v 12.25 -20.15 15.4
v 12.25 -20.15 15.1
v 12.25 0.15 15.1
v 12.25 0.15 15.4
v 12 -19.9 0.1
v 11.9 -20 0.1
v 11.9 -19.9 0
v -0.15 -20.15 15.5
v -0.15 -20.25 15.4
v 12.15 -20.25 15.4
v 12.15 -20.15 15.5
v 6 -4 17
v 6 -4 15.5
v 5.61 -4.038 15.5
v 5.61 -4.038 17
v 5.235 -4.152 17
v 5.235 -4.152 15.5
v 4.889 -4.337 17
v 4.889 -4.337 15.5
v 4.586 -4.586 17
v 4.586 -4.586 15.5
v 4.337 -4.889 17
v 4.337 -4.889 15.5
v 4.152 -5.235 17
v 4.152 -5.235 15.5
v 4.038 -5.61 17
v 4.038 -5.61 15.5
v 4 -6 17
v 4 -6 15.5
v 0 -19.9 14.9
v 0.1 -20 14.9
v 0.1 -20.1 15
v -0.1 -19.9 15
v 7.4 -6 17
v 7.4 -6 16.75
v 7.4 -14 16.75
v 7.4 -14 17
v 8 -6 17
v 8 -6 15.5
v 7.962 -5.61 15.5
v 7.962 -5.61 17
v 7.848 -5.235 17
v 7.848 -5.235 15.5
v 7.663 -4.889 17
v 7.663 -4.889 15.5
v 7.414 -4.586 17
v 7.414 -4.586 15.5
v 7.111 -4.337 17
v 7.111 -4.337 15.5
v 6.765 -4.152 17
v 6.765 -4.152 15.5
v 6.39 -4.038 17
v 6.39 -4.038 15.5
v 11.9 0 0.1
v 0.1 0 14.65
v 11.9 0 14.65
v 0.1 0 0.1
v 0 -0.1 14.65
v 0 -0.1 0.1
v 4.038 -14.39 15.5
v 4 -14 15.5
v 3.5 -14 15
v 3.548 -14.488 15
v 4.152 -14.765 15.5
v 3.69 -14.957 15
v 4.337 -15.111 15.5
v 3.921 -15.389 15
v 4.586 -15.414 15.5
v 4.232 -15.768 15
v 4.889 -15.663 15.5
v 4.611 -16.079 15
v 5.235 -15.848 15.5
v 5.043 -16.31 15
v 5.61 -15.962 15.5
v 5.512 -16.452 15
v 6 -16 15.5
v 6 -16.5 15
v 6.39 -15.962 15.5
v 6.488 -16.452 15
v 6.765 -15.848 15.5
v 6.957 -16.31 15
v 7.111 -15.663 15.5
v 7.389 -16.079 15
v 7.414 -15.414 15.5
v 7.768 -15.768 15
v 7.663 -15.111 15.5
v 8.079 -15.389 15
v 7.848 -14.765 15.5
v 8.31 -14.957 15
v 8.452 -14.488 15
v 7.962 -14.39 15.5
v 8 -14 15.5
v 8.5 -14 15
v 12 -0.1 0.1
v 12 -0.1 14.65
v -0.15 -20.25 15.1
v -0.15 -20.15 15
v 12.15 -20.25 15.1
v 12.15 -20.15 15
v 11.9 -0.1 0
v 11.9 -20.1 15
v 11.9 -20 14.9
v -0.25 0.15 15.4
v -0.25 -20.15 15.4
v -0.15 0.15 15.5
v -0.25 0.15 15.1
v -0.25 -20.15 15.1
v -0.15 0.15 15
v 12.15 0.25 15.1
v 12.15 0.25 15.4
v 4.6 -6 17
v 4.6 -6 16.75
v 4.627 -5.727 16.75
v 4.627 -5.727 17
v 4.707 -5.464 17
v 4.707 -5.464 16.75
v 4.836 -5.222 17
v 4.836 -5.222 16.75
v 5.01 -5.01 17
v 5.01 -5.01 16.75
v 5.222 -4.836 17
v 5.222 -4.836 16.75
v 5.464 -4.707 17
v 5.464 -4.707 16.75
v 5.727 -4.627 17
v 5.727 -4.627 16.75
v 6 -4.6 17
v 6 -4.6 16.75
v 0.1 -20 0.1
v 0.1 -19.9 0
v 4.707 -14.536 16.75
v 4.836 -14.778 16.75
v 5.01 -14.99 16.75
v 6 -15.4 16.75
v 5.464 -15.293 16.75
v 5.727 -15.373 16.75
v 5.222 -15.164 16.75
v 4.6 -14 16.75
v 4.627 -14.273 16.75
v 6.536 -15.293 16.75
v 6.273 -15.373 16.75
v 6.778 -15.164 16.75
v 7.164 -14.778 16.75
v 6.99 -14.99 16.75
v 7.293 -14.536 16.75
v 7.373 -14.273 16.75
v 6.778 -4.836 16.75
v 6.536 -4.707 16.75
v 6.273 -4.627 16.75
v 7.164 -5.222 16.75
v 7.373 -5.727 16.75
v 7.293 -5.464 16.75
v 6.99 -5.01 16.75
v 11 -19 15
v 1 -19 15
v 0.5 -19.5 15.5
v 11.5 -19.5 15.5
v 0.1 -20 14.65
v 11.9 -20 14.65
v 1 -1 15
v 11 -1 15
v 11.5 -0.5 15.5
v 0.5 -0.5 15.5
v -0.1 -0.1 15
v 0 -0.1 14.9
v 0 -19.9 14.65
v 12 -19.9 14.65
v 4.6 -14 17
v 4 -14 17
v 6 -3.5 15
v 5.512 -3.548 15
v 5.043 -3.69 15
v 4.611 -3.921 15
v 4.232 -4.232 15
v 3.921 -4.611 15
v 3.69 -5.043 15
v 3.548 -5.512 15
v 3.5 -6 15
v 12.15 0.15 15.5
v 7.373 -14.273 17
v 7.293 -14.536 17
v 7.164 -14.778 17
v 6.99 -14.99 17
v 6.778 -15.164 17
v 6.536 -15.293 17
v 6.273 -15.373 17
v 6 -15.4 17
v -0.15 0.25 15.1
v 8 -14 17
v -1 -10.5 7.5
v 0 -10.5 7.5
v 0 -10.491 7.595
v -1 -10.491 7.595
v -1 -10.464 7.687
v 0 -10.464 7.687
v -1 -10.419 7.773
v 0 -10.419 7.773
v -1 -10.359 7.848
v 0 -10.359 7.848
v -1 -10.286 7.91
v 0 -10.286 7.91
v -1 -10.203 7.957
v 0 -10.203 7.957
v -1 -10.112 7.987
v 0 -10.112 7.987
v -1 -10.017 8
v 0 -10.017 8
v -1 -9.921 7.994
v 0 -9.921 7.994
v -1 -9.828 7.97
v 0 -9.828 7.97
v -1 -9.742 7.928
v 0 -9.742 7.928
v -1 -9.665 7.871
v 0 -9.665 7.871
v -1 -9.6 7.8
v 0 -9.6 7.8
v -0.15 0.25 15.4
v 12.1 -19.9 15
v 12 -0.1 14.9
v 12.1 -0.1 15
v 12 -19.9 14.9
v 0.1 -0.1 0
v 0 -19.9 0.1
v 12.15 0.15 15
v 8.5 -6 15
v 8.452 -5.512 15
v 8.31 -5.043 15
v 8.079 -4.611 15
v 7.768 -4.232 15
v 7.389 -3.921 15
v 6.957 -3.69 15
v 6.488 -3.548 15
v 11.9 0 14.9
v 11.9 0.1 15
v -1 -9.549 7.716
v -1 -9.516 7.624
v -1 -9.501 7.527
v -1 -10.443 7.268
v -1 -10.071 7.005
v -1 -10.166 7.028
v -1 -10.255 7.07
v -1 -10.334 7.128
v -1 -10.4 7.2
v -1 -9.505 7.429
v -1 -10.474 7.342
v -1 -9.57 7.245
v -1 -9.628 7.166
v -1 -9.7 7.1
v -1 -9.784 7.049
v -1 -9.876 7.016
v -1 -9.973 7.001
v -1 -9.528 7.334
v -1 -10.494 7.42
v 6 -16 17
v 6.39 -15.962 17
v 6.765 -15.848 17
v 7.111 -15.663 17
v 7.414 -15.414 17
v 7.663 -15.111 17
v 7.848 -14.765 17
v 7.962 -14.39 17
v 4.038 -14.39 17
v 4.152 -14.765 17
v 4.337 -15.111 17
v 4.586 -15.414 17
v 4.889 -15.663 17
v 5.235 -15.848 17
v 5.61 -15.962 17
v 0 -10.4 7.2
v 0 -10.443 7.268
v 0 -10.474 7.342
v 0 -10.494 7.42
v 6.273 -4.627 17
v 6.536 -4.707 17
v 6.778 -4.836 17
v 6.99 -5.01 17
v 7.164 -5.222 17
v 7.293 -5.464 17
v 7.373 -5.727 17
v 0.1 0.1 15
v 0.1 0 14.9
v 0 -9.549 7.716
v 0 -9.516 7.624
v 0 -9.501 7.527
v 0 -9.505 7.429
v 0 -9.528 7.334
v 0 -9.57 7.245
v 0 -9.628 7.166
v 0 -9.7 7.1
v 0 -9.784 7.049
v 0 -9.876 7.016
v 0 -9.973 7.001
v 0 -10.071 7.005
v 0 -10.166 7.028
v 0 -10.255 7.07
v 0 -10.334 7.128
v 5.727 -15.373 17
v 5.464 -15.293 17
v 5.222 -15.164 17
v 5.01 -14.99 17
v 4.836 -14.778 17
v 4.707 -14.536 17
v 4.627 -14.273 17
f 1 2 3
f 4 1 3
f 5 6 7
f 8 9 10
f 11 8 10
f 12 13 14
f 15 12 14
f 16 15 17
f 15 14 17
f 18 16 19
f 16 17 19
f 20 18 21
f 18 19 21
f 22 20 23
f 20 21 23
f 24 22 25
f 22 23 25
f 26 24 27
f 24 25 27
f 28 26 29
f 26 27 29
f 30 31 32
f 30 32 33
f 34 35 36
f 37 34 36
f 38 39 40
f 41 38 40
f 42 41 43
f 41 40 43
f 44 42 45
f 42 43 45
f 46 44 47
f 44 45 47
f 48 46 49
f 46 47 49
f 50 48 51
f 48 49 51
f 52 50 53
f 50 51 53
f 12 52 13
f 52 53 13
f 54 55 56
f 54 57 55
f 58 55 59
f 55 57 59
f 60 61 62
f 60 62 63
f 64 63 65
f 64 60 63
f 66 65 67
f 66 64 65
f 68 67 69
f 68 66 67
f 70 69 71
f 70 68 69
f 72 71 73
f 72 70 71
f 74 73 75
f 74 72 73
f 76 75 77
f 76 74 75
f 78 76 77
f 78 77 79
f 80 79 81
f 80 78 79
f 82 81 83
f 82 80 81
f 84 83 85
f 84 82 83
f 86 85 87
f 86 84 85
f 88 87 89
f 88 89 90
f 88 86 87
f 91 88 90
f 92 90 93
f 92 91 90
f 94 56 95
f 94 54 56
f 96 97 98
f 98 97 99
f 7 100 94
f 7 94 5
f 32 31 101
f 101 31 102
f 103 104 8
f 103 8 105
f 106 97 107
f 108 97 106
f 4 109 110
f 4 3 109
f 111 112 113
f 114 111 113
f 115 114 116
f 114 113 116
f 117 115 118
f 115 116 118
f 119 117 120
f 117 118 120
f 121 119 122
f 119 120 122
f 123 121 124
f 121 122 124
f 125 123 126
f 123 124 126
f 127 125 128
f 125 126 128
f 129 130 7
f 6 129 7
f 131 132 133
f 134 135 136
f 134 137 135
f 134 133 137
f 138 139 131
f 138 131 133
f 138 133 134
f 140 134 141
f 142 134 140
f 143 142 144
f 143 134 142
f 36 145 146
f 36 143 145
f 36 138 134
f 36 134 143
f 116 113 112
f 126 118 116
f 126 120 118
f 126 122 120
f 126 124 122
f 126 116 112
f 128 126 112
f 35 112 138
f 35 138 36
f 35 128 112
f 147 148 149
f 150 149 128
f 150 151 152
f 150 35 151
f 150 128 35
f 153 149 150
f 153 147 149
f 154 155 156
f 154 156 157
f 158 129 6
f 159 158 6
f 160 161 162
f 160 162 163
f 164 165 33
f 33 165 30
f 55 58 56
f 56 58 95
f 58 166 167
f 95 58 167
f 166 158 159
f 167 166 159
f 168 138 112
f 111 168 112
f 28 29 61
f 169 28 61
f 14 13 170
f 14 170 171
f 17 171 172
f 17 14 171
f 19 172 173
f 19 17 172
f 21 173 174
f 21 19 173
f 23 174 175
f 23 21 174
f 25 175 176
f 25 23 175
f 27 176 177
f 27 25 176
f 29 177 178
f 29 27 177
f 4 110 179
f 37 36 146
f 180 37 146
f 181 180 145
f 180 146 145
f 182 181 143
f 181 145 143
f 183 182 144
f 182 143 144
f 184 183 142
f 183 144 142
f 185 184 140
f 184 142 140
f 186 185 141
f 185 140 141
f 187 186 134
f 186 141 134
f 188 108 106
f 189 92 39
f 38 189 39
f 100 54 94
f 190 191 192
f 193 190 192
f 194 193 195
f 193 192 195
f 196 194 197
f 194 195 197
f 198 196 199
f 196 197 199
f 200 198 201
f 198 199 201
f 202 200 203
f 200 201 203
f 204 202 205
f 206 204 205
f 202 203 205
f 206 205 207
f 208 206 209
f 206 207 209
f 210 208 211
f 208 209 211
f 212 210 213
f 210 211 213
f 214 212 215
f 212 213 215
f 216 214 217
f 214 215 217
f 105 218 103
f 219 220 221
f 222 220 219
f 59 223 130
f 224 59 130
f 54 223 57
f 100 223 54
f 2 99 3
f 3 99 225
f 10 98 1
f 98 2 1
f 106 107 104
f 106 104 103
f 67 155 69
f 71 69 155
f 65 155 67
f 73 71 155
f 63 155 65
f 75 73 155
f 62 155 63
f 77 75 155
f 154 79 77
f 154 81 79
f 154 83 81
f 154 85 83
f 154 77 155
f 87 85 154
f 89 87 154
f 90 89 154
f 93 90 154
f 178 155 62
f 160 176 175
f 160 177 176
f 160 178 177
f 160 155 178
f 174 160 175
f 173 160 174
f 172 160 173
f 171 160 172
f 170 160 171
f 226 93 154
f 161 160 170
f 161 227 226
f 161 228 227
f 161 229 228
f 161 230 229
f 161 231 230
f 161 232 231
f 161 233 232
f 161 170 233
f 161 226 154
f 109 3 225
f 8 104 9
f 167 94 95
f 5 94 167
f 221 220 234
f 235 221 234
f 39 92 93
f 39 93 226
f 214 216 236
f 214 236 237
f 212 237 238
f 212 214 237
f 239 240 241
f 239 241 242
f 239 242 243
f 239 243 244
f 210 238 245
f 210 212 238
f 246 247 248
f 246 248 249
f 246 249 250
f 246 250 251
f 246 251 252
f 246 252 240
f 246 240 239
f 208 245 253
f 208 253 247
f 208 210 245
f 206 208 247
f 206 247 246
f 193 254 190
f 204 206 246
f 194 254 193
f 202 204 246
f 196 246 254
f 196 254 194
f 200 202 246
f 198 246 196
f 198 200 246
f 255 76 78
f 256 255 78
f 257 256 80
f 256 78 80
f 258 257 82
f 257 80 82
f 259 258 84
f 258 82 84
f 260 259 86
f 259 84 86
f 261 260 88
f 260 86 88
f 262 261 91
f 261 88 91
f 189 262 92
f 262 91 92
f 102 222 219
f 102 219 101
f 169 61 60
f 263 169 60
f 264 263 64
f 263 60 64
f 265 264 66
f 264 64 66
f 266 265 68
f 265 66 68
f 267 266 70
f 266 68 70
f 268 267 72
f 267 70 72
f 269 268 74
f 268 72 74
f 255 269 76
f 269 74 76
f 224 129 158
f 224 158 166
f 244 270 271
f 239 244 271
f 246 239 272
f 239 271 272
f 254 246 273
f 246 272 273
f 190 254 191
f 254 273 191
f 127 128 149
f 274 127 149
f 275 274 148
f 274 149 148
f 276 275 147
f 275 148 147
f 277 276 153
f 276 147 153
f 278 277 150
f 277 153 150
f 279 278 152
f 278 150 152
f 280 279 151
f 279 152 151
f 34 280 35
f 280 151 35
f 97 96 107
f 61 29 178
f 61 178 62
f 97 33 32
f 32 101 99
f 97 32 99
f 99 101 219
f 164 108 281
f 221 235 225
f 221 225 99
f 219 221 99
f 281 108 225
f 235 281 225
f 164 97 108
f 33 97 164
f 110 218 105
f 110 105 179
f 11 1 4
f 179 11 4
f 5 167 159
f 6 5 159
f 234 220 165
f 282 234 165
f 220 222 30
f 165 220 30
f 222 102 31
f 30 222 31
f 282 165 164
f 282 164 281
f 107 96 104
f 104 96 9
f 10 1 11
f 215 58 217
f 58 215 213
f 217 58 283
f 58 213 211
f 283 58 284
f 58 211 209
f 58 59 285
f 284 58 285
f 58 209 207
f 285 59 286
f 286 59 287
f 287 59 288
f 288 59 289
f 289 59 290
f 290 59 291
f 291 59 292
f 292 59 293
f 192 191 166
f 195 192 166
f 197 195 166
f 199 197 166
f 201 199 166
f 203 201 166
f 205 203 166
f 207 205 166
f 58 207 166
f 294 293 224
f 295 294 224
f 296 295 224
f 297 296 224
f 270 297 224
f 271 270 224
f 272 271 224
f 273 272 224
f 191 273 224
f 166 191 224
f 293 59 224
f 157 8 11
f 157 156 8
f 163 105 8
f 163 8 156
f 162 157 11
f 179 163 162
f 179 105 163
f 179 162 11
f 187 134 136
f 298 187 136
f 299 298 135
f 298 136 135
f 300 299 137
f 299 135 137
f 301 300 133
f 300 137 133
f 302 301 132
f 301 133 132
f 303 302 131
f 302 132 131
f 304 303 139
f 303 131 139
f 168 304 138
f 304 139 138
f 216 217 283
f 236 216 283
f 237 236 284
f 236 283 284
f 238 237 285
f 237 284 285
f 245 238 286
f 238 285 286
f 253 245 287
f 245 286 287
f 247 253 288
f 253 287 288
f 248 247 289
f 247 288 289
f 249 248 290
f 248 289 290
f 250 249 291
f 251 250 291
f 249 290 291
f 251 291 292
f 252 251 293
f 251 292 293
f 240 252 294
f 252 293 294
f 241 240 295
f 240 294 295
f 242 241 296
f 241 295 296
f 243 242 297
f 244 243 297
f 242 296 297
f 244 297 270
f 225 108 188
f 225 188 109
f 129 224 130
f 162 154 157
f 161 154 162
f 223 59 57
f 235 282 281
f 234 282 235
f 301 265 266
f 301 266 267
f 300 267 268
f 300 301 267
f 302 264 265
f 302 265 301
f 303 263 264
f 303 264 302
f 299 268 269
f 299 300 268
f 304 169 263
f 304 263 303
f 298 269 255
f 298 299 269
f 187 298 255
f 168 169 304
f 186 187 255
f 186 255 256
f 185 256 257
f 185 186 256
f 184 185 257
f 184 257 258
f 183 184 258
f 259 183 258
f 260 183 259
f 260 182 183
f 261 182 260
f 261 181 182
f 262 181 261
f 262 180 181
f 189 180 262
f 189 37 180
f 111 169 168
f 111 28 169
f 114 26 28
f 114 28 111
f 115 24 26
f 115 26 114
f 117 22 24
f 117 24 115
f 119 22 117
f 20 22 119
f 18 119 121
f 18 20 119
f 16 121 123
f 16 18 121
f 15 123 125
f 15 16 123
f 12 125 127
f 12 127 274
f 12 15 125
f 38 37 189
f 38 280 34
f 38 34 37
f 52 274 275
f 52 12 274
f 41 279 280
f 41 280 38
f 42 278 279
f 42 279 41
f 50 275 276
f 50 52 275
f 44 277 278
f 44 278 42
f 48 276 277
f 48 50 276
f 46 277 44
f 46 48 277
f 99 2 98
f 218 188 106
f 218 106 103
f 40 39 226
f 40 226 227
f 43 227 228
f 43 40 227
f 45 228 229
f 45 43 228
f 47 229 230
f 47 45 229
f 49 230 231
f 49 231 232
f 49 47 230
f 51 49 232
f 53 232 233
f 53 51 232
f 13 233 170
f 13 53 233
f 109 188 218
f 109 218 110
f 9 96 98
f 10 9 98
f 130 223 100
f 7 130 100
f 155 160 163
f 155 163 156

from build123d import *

# Parameters (mm, degrees)
F0_W      = 12
F0_H      = 15
F1_DEPTH  = 20
F3_DEPTH  = 1
F4_W      = 12.5
F4_H      = 20.5
F4_W_2    = 12
F4_H_2    = 20
F5_DEPTH  = 0.5
F7_DEPTH  = 0.5
F9_DEPTH  = 2
F10_DEPTH = 1.75
F11_SIZE  = 0.1
F12_SIZE  = 0.49999
F13_W     = 2.4198924027
F13_H     = 0.5
F13_W_2   = 11.8
F13_W_3   = 1.8122543529
F14_DEPTH = 25
F15_DEPTH = 0.25


# Not quite as in the source:
# - a fillet or chamfer is up to 0.001 mm smaller than in the source, because OpenCascade refuses the exact size


with BuildPart() as f1:
    # F0 (on Front) → F1 (new body)
    with BuildSketch(Plane.XZ):
        with Locations((6, 7.5)):
            Rectangle(F0_W, F0_H)
    extrude(amount=F1_DEPTH)

    # F2 (on face) → F3 (join)
    with BuildSketch(Plane(origin=(0, 0, 0), x_dir=(0, -1, 0), z_dir=(-1, 0, 0))):
        with BuildLine():
            ThreePointArc((10.5, 7.5), (10.158113883, 7.974341649), (9.6, 7.8))
            Line((9.6, 7.8), (10.4, 7.2))
            ThreePointArc((10.4, 7.2), (10.474341649, 7.341886117), (10.5, 7.5))
        make_face()
        with BuildLine():
            Line((10.4, 7.2), (9.6, 7.8))
            ThreePointArc((9.6, 7.8), (9.7, 7.1), (10.4, 7.2))
        make_face()
    extrude(amount=F3_DEPTH)

    # F4 (on face) → F5 (join)
    with BuildSketch(Plane.XY.offset(15)):
        with Locations((6, -10)):
            Rectangle(F4_W, F4_H)
        with Locations((6, -10)):
            Rectangle(F4_W_2, F4_H_2, mode=Mode.SUBTRACT)
        Polygon((12, 0), (0, 0), (12, -20), align=None)
        Polygon((12, -20), (0, 0), (0, -20), align=None)
    extrude(amount=F5_DEPTH)

    # F6 (on face) → F7 (cut)
    with BuildSketch(Plane.XY.offset(15.5)):
        Polygon((11.5, -19.02), (0.5, -0.98), (0.5, -19.5), (11.5, -19.5), align=None)
        Polygon((0.5, -0.5), (0.5, -0.98), (11.5, -19.02), (11.5, -0.5), align=None)
    extrude(amount=-F7_DEPTH, mode=Mode.SUBTRACT)

    # F8 (on face) → F9 (join)
    with BuildSketch(Plane.XY.offset(15)):
        Polygon((4.6, -7.5818181818), (4, -6.5454545455), (4, -14), (4.6, -14), align=None)
        Polygon((4, -6), (4, -6.5454545455), (4.6, -7.5818181818), (4.6, -6), align=None)
        with BuildLine():
            ThreePointArc((6, -4), (4.5857864376, -4.5857864376), (4, -6))
            Line((4, -6), (4.6, -6))
            Line((4.6, -6), (4.6, -4.6))
            Line((4.6, -4.6), (6, -4.6))
            Line((6, -4.6), (7.4, -4.6))
            Line((7.4, -4.6), (7.4, -6))
            Line((7.4, -6), (8, -6))
            ThreePointArc((8, -6), (7.4142135624, -4.5857864376), (6, -4))
        make_face()
        with BuildLine():
            Line((4.6, -4.6), (4.6, -6))
            ThreePointArc((4.6, -6), (5.0100505063, -5.0100505063), (6, -4.6))
            Line((6, -4.6), (4.6, -4.6))
        make_face()
        with BuildLine():
            ThreePointArc((6, -4.6), (6.9899494937, -5.0100505063), (7.4, -6))
            Line((7.4, -6), (7.4, -4.6))
            Line((7.4, -4.6), (6, -4.6))
        make_face()
        Polygon((7.4, -6), (7.4, -12.4181818182), (8, -13.4545454545), (8, -6), align=None)
        Polygon((8, -13.4545454545), (7.4, -12.4181818182), (7.4, -14), (8, -14), align=None)
        with BuildLine():
            Line((4.6, -14), (4, -14))
            ThreePointArc((4, -14), (4.5857864376, -15.4142135624), (6, -16))
            ThreePointArc((6, -16), (7.4142135624, -15.4142135624), (8, -14))
            Line((8, -14), (7.4, -14))
            Line((7.4, -14), (7.4, -15.4))
            Line((7.4, -15.4), (6, -15.4))
            Line((6, -15.4), (4.6, -15.4))
            Line((4.6, -15.4), (4.6, -14))
        make_face()
        with BuildLine():
            Line((7.4, -15.4), (7.4, -14))
            ThreePointArc((7.4, -14), (6.9899494937, -14.9899494937), (6, -15.4))
            Line((6, -15.4), (7.4, -15.4))
        make_face()
        with BuildLine():
            ThreePointArc((6, -15.4), (5.0100505063, -14.9899494937), (4.6, -14))
            Line((4.6, -14), (4.6, -15.4))
            Line((4.6, -15.4), (6, -15.4))
        make_face()
    extrude(amount=F9_DEPTH)

    # F10 (add): a face of the model
    f10_faces = [f1.faces().sort_by_distance(p)[0] for p in [
        (6, -10, 15),
    ]]
    extrude(f10_faces, amount=F10_DEPTH)

    # F11
    f11_edges = [f1.edges().sort_by_distance(p)[0] for p in [
        (0, 0, 7.5),
        (0, -10, 0),
        (6, 0, 0),
        (0, -20, 7.5),
        (6, -20, 0),
        (12, -20, 7.5),
        (12, 0, 7.5),
        (12, -10, 0),
        (12.25, -20.25, 15.25),
        (12.25, 0.25, 15.25),
        (12.25, -10, 15),
        (12, -10, 15),
        (6, -20, 15),
        (6, -20.25, 15),
        (0, -10, 15),
        (-0.25, -20.25, 15.25),
        (-0.25, -10, 15),
        (6, 0.25, 15),
        (-0.25, 0.25, 15.25),
        (6, 0.25, 15.5),
        (-0.25, -10, 15.5),
        (12.25, -10, 15.5),
        (6, -20.25, 15.5),
        (6, 0, 15),
    ]]
    chamfer(f11_edges, length=F11_SIZE)

    # F12 (size 0.5 in the source; OpenCascade refuses exactly that, so slightly less here)
    f12_edges = [f1.edges().sort_by_distance(p)[0] for p in [
        (0.5, -10, 15),
        (6, -0.5, 15),
        (11.5, -10, 15),
        (6, -19.5, 15),
        (8, -10, 15),
        (6, -4, 15),
        (4, -10, 15),
        (6, -16, 15),
    ]]
    chamfer(f12_edges, length=F12_SIZE)

    # F13 (on face) → F14 (cut)
    with BuildSketch(Plane.XZ.offset(20)):
        with Locations((-1.1099462014, 14.65)):
            Rectangle(F13_W, F13_H)
        with Locations((6, 14.65)):
            Rectangle(F13_W_2, F13_H)
        with Locations((12.8061271764, 14.65)):
            Rectangle(F13_W_3, F13_H)
    extrude(amount=-F14_DEPTH, mode=Mode.SUBTRACT)

    # F15 (add): a face of the model
    f15_faces = [f1.faces().sort_by_distance(p)[0] for p in [
        (6, -10, 14.4),
    ]]
    extrude(f15_faces, amount=F15_DEPTH)


solid = f1.part
